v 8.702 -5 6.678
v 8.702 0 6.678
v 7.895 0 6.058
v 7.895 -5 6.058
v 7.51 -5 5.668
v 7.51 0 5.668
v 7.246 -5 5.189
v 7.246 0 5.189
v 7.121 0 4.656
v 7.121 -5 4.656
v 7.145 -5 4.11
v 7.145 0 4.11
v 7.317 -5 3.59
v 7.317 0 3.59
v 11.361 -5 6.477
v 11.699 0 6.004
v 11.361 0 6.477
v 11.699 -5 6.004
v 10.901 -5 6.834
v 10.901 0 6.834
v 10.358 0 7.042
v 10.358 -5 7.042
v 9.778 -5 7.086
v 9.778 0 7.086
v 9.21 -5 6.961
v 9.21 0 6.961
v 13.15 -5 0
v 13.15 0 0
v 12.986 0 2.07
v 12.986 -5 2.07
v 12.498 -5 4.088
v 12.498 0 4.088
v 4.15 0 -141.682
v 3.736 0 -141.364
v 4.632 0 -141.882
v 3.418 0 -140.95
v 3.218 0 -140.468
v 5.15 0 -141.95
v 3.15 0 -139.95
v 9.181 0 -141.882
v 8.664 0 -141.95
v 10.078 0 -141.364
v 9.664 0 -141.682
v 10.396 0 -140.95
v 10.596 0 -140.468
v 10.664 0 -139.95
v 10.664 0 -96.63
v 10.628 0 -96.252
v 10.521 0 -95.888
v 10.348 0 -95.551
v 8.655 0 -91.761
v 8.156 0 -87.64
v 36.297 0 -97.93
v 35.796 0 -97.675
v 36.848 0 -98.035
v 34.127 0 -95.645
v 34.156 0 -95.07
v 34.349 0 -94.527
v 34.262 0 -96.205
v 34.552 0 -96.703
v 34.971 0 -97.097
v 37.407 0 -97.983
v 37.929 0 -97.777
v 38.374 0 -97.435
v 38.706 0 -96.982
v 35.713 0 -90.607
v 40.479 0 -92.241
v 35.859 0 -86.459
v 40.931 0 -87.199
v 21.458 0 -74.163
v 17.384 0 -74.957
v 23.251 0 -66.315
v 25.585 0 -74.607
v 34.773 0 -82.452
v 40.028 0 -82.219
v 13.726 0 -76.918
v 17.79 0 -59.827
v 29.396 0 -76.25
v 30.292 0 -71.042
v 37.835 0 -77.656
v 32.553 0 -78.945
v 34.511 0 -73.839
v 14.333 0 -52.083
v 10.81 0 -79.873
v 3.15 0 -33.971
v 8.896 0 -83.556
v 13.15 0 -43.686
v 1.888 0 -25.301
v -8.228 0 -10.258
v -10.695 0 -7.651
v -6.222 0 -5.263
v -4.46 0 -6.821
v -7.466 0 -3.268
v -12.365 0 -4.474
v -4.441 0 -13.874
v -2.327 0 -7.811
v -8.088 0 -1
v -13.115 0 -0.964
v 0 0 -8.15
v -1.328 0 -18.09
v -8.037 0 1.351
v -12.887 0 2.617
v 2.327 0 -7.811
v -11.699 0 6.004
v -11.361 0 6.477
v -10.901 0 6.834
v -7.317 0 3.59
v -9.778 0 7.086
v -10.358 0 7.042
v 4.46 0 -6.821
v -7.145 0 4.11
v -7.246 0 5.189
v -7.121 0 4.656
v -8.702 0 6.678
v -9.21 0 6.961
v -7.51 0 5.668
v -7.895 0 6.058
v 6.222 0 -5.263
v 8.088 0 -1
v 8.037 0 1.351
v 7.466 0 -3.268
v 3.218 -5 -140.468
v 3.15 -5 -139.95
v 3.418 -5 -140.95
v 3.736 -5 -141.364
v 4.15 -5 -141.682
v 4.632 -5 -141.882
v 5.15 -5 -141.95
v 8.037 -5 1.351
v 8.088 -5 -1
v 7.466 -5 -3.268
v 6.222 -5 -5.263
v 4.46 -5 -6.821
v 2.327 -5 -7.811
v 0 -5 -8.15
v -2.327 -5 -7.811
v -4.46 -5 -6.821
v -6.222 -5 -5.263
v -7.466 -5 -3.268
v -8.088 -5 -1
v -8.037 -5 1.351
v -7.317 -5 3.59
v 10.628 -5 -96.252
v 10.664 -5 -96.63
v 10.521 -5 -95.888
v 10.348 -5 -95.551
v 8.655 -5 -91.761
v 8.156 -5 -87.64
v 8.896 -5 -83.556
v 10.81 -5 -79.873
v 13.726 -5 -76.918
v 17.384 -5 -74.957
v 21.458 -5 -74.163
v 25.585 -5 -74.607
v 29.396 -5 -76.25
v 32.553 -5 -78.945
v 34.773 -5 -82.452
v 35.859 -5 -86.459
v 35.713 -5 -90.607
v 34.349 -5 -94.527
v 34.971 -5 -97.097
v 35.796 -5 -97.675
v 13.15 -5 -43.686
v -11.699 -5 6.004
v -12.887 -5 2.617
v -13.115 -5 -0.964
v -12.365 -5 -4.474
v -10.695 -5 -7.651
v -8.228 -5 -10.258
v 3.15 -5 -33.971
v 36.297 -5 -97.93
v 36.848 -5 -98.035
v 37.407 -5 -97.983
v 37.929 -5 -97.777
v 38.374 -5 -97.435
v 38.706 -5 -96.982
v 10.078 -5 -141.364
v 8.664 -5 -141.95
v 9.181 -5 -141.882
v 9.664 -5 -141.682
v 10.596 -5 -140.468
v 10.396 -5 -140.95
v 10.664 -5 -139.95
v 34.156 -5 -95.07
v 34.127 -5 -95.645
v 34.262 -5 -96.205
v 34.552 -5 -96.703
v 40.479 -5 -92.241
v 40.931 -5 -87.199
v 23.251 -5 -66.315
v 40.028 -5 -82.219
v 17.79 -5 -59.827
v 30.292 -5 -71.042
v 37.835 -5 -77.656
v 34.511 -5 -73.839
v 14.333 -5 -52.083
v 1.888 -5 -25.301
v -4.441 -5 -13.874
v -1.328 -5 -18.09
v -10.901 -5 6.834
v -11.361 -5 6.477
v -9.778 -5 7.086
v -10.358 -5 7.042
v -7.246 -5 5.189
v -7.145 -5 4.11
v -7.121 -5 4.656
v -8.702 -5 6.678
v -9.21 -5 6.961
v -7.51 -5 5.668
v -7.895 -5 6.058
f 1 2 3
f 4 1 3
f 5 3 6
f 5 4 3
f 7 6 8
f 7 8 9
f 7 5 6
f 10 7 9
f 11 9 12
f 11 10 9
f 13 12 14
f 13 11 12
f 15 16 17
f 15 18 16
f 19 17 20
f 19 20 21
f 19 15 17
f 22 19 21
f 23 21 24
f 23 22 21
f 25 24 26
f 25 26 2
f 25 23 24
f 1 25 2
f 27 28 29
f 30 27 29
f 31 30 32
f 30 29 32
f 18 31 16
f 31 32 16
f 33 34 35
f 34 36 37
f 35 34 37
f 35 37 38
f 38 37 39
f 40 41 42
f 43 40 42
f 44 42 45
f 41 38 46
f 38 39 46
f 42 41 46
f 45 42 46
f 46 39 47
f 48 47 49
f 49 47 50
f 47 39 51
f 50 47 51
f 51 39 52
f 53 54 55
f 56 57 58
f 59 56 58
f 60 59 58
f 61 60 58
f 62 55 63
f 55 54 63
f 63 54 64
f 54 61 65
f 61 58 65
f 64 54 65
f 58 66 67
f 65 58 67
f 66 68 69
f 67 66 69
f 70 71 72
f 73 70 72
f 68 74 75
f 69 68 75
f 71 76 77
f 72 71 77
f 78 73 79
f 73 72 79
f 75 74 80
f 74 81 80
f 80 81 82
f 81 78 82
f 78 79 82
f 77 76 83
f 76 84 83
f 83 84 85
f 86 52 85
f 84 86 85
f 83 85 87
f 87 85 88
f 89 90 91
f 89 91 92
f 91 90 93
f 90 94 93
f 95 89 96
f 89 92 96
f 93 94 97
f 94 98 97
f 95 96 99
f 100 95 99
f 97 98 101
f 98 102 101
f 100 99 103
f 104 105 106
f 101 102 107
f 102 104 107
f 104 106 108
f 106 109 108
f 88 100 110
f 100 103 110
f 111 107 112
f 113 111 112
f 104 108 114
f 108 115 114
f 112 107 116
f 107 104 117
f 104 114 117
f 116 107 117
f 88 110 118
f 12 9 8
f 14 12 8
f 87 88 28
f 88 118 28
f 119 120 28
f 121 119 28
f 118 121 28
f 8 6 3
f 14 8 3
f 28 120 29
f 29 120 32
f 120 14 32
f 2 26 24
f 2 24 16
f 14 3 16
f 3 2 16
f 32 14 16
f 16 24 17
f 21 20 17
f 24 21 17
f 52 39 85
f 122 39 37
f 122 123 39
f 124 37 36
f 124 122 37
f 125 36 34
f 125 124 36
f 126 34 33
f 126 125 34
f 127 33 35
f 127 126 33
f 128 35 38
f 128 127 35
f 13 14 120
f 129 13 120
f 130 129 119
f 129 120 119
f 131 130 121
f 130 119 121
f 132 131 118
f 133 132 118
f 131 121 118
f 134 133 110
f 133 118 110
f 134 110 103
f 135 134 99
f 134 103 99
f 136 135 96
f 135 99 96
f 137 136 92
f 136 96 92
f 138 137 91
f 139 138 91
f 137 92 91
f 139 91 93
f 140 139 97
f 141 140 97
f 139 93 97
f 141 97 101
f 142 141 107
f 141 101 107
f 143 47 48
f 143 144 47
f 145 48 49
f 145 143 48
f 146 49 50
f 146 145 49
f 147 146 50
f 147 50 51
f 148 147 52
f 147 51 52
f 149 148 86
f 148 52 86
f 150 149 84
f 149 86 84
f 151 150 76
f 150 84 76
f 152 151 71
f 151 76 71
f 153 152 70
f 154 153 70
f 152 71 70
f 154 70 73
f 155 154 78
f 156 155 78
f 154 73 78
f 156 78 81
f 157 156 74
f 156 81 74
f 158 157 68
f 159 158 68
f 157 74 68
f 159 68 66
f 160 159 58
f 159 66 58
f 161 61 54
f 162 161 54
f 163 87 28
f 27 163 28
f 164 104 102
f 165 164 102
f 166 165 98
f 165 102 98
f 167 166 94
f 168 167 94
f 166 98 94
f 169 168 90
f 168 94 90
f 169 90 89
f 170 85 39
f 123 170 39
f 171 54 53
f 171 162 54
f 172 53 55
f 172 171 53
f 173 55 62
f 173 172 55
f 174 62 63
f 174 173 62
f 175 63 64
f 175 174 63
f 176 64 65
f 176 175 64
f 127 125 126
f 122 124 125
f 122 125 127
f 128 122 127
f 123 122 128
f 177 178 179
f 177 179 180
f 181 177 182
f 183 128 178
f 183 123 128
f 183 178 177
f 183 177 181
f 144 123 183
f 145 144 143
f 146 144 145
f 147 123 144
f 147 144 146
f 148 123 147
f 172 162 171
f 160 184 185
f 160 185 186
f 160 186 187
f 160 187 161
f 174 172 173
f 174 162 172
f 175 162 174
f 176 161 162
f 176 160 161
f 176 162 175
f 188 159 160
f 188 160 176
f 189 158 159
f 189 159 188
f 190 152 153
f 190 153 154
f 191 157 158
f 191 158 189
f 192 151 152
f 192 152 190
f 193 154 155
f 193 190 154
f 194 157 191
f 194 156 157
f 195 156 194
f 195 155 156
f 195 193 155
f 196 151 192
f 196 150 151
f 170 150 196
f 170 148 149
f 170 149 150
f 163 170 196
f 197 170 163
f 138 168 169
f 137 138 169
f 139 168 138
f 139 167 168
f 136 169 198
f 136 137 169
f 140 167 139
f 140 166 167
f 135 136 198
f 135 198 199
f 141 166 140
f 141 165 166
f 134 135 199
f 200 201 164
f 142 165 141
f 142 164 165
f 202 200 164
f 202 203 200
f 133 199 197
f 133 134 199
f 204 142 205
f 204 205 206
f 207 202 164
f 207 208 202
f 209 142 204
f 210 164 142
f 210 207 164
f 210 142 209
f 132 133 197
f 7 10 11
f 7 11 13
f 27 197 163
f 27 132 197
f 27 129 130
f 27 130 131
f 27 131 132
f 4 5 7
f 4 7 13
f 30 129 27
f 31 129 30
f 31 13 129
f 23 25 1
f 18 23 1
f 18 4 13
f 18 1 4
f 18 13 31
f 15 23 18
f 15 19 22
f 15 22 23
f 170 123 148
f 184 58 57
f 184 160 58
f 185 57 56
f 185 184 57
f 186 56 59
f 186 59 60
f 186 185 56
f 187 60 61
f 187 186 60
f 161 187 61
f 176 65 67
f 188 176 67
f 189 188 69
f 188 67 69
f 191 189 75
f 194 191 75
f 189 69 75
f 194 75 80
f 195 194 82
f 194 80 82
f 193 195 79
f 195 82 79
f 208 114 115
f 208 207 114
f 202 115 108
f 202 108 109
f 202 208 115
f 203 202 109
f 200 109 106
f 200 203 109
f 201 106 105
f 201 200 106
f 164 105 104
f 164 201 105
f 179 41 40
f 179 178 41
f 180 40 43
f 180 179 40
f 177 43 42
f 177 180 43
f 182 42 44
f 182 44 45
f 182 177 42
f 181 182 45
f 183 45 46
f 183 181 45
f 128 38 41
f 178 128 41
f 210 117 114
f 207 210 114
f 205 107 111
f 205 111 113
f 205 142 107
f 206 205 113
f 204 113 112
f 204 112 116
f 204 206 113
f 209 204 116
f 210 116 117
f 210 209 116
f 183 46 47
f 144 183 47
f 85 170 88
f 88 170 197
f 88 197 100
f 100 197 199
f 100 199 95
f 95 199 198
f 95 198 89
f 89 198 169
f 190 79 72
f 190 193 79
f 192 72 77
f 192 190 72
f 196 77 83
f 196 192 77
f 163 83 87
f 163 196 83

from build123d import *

# Parameters (mm, degrees)
F1_DEPTH = 5
F2_R     = 2
F3_R     = 30.3991713246


with BuildPart() as f1:
    # F0 (on Front) → F1 (new body)
    with BuildSketch(Plane.XZ):
        with BuildLine():
            ThreePointArc((8.4325112108, -10.0903545369), (5.9438997073, -11.7299853482), (3.15, -12.7671453348))
            Line((3.15, -12.7671453348), (3.15, -88.05))
            ThreePointArc((3.15, -88.05), (3.6076950345, -83.915826859), (4.9586124402, -79.9818855189))
            ThreePointArc((4.9586124402, -79.9818855189), (8.3605698088, -75.0189025389), (13.15, -71.3766679995))
            Line((13.15, -71.3766679995), (13.15, 0))
            ThreePointArc((13.15, 0), (11.91238898, -5.569334681), (8.4325112108, -10.0903545369))
        make_face()
        with BuildLine():
            ThreePointArc((4.9586124402, -79.9818855189), (3.6076950345, -83.915826859), (3.15, -88.05))
            ThreePointArc((3.15, -88.05), (4.0247496309, -93.7333396106), (6.5680263629, -98.890594647))
            Line((6.5680263629, -98.890594647), (10.6637865844, -96.0227124653))
            ThreePointArc((10.6637865844, -96.0227124653), (22.05, -74.15), (33.4362134156, -96.0227124653))
            Line((33.4362134156, -96.0227124653), (37.5319736371, -98.890594647))
            ThreePointArc((37.5319736371, -98.890594647), (36.1951275757, -75.5150342694), (13.15, -71.3766679995))
            ThreePointArc((13.15, -71.3766679995), (8.3605698088, -75.0189025389), (4.9586124402, -79.9818855189))
        make_face()
        with BuildLine():
            ThreePointArc((6.5680263629, -98.890594647), (4.0247496309, -93.7333396106), (3.15, -88.05))
            Line((3.15, -88.05), (3.15, -141.95))
            Line((3.15, -141.95), (10.6637865844, -141.95))
            Line((10.6637865844, -141.95), (10.6637865844, -103.1352293338))
            ThreePointArc((10.6637865844, -103.1352293338), (8.4492978203, -101.1736770845), (6.5680263629, -98.890594647))
        make_face()
        with BuildLine():
            Line((10.6637865844, -96.0227124653), (6.5680263629, -98.890594647))
            ThreePointArc((6.5680263629, -98.890594647), (8.4492978203, -101.1736770845), (10.6637865844, -103.1352293338))
            Line((10.6637865844, -103.1352293338), (10.6637865844, -96.0227124653))
        make_face()
        with BuildLine():
            ThreePointArc((-10.4325964248, 8.0052127915), (-12.666067706, -3.5345761935), (-4.7800799709, -12.2504422562))
            ThreePointArc((-4.7800799709, -12.2504422562), (-0.8550062548, -13.1221745265), (3.15, -12.7671453348))
            ThreePointArc((3.15, -12.7671453348), (5.9438997073, -11.7299853482), (8.4325112108, -10.0903545369))
            ThreePointArc((8.4325112108, -10.0903545369), (11.91238898, -5.569334681), (13.15, 0))
            ThreePointArc((13.15, 0), (12.4521312029, 4.2269289687), (10.4325964248, 8.0052127915))
            Line((10.4325964248, 8.0052127915), (6.4658297234, 4.9614056464))
            ThreePointArc((6.4658297234, 4.9614056464), (0, -8.15), (-6.4658297234, 4.9614056464))
            Line((-6.4658297234, 4.9614056464), (-10.4325964248, 8.0052127915))
        make_face()
    extrude(amount=F1_DEPTH)

    # F2
    f2_edges = [f1.edges().sort_by_distance(p)[0] for p in [
        (6.46583, -2.5, 4.961406),
        (-6.46583, -2.5, 4.961406),
        (-10.432596, -2.5, 8.005213),
        (10.663787, -2.5, -96.022712),
        (33.436213, -2.5, -96.022712),
        (37.531974, -2.5, -98.890595),
        (3.15, -2.5, -141.95),
        (10.663787, -2.5, -141.95),
        (10.432596, -2.5, 8.005213),
    ]]
    fillet(f2_edges, radius=F2_R)

    # F3
    f3_edges = [f1.edges().sort_by_distance(p)[0] for p in [
        (3.15, -2.5, -12.767145),
        (13.15, -2.5, -71.376668),
    ]]
    fillet(f3_edges, radius=F3_R)


solid = f1.part
